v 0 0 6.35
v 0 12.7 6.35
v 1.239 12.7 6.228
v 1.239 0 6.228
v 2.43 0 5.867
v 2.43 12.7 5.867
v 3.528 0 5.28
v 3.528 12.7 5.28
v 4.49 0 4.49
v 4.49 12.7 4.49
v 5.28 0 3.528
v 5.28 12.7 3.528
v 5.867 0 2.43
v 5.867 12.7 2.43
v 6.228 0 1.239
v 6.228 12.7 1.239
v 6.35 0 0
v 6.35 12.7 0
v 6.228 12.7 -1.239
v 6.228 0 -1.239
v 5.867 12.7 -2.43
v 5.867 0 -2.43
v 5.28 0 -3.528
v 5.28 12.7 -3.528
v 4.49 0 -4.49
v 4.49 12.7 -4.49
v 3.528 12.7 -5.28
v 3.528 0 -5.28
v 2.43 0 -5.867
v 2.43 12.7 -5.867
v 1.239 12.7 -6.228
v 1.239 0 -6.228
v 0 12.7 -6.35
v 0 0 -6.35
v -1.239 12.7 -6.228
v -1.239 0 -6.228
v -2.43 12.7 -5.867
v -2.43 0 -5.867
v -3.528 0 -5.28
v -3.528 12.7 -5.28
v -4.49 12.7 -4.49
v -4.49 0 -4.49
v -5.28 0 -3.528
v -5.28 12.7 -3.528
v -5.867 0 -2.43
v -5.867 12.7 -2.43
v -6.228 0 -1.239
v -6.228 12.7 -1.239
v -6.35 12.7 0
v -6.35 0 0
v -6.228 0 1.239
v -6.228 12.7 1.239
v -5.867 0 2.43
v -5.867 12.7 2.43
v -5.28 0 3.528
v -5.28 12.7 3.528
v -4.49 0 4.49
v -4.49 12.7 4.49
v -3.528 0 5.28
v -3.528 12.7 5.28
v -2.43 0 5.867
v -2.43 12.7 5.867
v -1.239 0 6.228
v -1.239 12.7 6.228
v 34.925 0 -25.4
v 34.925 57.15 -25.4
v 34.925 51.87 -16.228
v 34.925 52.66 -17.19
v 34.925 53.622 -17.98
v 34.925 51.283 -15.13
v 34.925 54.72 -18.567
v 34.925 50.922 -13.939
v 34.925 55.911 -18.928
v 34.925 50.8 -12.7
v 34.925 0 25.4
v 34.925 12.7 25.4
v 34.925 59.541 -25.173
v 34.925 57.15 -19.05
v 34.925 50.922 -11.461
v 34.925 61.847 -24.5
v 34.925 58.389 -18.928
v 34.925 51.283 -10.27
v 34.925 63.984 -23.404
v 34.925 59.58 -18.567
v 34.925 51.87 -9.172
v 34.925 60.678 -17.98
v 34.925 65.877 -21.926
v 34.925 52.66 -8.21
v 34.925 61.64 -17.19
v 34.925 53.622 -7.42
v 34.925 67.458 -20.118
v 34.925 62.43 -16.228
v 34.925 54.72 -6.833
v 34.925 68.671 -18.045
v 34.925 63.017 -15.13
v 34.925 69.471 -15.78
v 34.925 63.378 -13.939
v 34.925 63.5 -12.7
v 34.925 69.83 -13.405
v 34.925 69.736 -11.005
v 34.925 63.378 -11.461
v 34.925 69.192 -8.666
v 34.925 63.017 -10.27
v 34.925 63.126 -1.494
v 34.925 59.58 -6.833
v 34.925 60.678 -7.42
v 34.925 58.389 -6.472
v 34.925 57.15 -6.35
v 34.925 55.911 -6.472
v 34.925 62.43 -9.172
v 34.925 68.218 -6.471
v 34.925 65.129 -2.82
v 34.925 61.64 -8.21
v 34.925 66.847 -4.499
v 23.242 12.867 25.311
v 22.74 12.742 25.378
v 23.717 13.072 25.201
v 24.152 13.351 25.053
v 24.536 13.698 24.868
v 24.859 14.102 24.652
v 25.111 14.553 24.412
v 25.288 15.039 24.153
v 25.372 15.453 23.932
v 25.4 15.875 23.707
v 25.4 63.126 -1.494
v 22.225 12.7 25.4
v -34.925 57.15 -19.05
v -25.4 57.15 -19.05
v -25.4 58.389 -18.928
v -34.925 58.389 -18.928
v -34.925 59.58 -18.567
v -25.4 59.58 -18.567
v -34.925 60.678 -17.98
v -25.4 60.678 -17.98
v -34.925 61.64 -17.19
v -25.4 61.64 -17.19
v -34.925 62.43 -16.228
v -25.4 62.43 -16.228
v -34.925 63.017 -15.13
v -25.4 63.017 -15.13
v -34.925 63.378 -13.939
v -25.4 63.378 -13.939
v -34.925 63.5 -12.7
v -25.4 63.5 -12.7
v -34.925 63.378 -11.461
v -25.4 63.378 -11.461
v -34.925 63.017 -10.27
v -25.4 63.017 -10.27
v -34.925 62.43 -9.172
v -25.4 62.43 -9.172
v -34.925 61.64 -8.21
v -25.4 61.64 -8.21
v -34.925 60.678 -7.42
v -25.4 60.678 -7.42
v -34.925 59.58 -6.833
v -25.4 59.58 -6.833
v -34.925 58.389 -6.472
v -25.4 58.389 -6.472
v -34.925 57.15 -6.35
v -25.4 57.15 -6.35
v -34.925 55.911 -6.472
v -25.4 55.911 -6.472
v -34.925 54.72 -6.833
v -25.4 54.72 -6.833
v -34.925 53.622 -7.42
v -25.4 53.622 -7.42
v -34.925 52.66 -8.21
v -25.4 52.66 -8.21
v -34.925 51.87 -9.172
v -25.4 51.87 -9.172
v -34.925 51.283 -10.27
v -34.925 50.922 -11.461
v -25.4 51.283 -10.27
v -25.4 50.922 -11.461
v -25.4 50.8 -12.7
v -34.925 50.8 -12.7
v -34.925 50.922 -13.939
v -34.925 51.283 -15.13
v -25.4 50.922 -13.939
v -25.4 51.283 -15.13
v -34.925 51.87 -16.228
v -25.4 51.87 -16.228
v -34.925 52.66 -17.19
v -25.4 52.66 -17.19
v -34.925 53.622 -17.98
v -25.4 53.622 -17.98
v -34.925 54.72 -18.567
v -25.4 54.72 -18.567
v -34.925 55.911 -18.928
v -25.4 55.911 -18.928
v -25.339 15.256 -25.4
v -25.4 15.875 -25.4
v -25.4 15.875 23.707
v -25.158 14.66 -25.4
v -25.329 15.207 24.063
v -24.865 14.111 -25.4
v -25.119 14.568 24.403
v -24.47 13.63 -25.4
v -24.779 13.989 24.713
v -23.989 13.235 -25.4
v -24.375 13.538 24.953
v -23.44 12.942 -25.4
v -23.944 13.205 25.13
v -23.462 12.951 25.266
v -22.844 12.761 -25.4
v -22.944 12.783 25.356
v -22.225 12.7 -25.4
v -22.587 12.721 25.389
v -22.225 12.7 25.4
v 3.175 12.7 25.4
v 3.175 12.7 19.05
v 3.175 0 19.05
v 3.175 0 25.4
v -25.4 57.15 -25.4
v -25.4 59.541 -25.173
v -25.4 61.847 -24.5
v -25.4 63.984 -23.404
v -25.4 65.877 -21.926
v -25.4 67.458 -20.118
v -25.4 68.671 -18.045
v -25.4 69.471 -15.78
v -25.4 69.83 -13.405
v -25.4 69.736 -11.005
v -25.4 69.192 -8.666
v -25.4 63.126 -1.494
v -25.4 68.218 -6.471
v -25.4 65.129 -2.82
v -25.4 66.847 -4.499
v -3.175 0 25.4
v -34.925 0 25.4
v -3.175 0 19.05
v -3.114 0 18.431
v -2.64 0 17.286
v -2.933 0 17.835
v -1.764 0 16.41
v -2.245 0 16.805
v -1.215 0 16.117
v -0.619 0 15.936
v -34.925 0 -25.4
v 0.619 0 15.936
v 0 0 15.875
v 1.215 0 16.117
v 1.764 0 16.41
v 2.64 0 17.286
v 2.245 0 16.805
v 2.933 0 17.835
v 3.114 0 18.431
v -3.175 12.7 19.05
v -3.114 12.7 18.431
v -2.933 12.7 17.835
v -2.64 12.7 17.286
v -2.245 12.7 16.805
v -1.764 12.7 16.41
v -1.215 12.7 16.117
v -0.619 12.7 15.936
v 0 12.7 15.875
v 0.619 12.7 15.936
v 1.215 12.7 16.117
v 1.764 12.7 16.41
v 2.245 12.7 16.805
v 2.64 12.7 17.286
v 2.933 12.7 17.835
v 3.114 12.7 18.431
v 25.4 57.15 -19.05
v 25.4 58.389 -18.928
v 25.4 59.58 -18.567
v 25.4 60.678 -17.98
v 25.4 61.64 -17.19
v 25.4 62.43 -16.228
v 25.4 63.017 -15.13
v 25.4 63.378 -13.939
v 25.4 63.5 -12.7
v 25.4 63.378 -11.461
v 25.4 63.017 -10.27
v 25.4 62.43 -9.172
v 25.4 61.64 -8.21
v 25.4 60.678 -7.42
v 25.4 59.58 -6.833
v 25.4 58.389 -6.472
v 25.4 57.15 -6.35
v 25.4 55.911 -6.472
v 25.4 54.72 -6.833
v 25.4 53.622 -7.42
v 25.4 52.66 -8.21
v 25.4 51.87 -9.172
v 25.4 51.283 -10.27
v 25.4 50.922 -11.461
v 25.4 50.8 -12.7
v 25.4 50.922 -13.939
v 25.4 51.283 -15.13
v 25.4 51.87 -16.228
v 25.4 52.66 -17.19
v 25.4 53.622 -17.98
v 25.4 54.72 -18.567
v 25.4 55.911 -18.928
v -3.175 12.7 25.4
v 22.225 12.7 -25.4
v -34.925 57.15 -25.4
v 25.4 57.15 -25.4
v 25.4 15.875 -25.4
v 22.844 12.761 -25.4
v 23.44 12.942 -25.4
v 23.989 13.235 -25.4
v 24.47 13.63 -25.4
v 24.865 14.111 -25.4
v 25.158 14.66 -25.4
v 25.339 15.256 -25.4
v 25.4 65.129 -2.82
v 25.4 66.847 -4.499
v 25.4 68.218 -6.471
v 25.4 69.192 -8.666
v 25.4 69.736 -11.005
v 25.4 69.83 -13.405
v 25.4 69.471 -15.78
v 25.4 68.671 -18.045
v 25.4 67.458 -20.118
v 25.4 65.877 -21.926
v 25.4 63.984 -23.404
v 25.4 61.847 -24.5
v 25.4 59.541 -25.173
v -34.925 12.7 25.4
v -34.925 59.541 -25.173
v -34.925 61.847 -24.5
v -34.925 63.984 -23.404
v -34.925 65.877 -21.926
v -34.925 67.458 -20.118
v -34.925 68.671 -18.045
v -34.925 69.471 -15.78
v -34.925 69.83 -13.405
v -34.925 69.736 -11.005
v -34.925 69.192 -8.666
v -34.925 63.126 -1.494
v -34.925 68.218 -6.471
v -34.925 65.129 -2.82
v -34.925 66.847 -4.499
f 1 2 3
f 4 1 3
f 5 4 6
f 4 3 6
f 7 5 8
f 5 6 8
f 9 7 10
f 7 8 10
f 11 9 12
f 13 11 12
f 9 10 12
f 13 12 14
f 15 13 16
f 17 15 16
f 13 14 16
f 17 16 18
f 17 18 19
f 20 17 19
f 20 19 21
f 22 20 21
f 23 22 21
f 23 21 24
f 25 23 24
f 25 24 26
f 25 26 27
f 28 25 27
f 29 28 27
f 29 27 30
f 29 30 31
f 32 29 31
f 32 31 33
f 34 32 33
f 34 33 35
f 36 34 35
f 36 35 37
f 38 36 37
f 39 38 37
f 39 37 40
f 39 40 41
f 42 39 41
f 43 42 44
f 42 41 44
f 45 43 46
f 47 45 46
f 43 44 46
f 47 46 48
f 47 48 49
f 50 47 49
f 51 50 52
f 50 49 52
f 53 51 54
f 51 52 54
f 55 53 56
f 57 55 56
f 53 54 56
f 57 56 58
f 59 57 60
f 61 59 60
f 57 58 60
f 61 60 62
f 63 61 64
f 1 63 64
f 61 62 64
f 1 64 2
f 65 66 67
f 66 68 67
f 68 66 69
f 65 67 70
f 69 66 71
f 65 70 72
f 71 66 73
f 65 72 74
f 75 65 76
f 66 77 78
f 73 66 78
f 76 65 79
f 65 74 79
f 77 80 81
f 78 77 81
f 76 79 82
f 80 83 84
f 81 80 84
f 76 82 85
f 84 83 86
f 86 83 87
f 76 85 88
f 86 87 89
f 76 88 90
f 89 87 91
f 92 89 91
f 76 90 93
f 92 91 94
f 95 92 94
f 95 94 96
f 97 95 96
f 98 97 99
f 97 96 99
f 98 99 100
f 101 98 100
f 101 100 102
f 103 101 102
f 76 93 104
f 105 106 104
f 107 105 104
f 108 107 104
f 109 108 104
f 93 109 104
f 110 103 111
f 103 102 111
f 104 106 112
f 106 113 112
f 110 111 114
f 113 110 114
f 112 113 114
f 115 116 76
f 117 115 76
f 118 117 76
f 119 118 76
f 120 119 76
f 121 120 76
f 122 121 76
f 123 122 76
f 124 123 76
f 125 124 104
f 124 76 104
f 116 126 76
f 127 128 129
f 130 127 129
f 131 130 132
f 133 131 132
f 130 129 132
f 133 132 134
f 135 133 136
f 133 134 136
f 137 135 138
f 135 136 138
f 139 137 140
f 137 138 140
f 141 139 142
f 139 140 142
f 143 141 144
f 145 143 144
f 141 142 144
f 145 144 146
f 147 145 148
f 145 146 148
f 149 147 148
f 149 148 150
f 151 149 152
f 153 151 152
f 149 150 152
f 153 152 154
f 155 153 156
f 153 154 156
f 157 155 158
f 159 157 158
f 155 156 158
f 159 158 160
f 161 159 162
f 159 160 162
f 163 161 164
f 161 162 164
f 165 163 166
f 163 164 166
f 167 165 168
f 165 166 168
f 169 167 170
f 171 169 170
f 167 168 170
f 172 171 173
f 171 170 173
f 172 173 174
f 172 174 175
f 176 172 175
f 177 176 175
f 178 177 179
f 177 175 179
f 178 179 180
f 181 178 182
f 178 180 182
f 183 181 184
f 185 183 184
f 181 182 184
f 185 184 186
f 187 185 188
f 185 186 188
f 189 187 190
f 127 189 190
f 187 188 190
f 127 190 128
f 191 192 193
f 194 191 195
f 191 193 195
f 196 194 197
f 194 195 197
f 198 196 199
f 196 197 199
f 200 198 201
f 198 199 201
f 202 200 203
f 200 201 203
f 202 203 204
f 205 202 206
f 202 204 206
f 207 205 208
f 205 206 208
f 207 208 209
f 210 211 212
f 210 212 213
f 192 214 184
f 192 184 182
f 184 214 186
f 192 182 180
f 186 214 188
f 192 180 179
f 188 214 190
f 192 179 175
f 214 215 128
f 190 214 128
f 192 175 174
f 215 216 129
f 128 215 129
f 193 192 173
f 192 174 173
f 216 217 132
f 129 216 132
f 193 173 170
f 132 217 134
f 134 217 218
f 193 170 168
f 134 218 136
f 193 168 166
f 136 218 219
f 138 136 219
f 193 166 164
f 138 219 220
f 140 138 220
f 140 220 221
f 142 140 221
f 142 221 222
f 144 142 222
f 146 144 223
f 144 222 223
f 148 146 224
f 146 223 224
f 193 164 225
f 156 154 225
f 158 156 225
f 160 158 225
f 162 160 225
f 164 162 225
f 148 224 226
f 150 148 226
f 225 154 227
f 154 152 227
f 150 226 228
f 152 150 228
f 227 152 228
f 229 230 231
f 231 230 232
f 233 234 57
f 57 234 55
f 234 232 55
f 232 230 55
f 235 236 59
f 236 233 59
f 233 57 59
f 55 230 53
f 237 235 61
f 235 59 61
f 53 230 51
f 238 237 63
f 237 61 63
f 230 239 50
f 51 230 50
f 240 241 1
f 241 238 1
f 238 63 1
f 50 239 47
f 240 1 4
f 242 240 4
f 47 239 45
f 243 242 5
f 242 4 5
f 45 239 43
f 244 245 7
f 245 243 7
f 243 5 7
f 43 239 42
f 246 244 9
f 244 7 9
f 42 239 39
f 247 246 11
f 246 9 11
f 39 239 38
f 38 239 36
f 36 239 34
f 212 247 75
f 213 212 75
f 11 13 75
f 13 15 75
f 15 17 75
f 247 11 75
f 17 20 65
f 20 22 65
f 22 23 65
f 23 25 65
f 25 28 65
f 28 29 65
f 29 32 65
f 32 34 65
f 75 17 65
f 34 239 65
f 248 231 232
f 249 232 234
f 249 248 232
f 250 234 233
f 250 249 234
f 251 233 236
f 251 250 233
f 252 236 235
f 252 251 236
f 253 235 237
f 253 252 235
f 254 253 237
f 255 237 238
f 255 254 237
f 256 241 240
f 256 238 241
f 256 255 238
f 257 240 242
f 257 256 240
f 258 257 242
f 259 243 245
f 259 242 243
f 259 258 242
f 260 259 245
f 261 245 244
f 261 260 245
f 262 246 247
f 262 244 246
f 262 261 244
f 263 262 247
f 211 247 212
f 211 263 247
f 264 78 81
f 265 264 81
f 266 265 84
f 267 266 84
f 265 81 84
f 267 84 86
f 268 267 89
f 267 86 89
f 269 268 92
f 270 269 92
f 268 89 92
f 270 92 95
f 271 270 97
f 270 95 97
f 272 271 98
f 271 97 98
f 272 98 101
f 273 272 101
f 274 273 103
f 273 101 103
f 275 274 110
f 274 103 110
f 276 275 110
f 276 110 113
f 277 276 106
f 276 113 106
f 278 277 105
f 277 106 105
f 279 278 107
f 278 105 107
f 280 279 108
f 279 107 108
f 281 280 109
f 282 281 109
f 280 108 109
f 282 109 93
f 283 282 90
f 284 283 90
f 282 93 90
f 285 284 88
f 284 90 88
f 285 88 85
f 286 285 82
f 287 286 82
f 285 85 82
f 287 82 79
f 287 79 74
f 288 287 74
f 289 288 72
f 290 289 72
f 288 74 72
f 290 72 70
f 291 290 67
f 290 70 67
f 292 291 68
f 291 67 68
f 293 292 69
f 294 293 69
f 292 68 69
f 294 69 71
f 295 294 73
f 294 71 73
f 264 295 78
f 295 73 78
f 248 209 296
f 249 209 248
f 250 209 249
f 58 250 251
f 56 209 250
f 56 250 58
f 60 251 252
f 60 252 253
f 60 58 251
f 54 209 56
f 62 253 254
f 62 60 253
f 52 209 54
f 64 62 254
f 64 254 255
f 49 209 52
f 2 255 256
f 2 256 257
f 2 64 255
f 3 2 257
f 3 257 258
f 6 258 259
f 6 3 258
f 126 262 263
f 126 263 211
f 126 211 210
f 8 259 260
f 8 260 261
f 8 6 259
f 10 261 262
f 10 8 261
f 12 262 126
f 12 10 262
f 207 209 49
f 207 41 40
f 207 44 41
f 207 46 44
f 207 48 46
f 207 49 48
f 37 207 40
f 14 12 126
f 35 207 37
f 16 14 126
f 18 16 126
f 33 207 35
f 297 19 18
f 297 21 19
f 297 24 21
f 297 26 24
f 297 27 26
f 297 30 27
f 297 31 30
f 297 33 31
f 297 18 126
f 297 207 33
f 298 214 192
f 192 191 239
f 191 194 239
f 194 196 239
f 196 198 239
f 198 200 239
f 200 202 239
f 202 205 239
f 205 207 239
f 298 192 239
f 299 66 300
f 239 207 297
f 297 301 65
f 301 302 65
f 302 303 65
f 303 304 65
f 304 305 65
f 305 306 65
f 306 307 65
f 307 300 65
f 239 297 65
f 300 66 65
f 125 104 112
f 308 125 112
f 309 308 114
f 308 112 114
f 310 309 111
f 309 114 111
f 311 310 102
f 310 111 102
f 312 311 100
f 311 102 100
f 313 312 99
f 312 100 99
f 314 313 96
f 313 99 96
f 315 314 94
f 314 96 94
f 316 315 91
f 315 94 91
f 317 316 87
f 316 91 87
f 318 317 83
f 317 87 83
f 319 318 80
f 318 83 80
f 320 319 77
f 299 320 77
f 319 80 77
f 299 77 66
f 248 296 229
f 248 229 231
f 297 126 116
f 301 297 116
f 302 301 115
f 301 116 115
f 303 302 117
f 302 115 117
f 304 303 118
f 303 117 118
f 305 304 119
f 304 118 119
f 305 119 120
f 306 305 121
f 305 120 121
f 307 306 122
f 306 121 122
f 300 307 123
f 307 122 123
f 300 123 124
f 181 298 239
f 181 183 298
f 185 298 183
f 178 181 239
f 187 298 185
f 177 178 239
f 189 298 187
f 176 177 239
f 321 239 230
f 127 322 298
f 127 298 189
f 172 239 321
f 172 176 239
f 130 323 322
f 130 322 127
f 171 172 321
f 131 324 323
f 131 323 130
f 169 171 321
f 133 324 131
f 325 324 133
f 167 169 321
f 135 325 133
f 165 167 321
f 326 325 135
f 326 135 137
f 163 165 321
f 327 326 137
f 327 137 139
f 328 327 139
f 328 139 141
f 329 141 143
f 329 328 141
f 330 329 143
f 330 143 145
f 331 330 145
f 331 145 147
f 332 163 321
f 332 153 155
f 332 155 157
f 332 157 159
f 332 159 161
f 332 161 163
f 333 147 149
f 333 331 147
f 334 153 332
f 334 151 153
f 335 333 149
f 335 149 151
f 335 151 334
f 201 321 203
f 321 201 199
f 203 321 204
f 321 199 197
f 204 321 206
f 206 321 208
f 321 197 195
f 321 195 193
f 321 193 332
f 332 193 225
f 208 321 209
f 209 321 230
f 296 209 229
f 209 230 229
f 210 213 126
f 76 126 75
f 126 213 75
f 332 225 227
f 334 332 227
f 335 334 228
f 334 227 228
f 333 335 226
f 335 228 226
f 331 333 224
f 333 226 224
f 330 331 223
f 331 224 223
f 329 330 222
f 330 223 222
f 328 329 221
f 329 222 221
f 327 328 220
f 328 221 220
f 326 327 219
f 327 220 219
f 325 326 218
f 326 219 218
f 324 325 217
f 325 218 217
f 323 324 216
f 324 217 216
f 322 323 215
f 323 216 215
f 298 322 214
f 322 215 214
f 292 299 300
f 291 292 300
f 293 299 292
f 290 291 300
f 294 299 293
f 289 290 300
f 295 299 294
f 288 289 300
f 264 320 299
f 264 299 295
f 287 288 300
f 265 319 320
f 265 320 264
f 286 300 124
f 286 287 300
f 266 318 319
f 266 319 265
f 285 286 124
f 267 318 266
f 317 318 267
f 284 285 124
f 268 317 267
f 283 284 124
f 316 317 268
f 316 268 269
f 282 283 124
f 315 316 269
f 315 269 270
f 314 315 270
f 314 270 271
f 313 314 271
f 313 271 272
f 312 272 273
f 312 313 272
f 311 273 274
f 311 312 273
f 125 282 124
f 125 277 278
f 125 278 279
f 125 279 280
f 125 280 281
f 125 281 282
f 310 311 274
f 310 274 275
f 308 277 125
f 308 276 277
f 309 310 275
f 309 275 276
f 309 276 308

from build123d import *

# Parameters (mm, degrees)
SKETCH1_W           = 69.85
SKETCH1_H           = 50.8
BOSS_EXTRUDE1_DEPTH = 12.7
BOSS_EXTRUDE2_START = 34.925
SKETCH2_R           = 6.35
BOSS_EXTRUDE2_DEPTH = 9.525
BOSS_EXTRUDE3_START = -25.4
SKETCH2_2_R         = 6.35
BOSS_EXTRUDE3_DEPTH = 9.525
SKETCH3_R           = 6.35
CUT_EXTRUDE1_DEPTH  = 72.631264997
FILLET2_R           = 3.175


with BuildPart() as part:
    # Sketch1 → Boss-Extrude1 (new body)
    with BuildSketch(Plane(origin=(0, 0, 0), x_dir=(1, 0, 0), z_dir=(0, 1, 0))):
        Rectangle(SKETCH1_W, SKETCH1_H)
    extrude(amount=BOSS_EXTRUDE1_DEPTH)

    # Sketch2 → Boss-Extrude2 (add)
    with BuildSketch(Plane(origin=(0, 0, 0), x_dir=(0, 0, -1), z_dir=(1, 0, 0)).offset(BOSS_EXTRUDE2_START)):
        with BuildLine():
            Line((-25.4, 12.7), (1.494117647, 63.126470588))
            ThreePointArc((1.494117647, 63.126470588), (15.780202438, 69.470809752), (25.4, 57.15))
            Line((25.4, 57.15), (25.4, 12.7))
            Line((25.4, 12.7), (-25.4, 12.7))
        make_face()
        with Locations((12.7, 57.15)):
            Circle(SKETCH2_R, mode=Mode.SUBTRACT)
    extrude(amount=-BOSS_EXTRUDE2_DEPTH)

    # Sketch2<2> → Boss-Extrude3 (add)
    with BuildSketch(Plane(origin=(0, 0, 0), x_dir=(0, 0, -1), z_dir=(1, 0, 0)).offset(BOSS_EXTRUDE3_START)):
        with BuildLine():
            Line((-25.4, 12.7), (1.494117647, 63.126470588))
            ThreePointArc((1.494117647, 63.126470588), (15.780202438, 69.470809752), (25.4, 57.15))
            Line((25.4, 57.15), (25.4, 12.7))
            Line((25.4, 12.7), (-25.4, 12.7))
        make_face()
        with Locations((12.7, 57.15)):
            Circle(SKETCH2_2_R, mode=Mode.SUBTRACT)
    extrude(amount=-BOSS_EXTRUDE3_DEPTH)

    # Sketch3 → Cut-Extrude1 (cut, through all)
    with BuildSketch(Plane(origin=(0, 12.7, 0), x_dir=(1, 0, 0), z_dir=(0, 1, 0))):
        with Locations(Location((0, 0, 0), (0, 0, 270))):
            Circle(SKETCH3_R)
        with BuildLine():
            Line((3.175, -19.05), (3.175, -25.4))
            Line((3.175, -25.4), (-3.175, -25.4))
            Line((-3.175, -25.4), (-3.175, -19.05))
            ThreePointArc((-3.175, -19.05), (0, -15.875), (3.175, -19.05))
        make_face()
    extrude(amount=-CUT_EXTRUDE1_DEPTH, mode=Mode.SUBTRACT)

    # Fillet2
    fillet2_edges = [part.edges().sort_by_distance(p)[0] for p in [
        (25.4, 12.7, 0),
        (-25.4, 12.7, 0),
    ]]
    fillet(fillet2_edges, radius=FILLET2_R)


solid = part.part
